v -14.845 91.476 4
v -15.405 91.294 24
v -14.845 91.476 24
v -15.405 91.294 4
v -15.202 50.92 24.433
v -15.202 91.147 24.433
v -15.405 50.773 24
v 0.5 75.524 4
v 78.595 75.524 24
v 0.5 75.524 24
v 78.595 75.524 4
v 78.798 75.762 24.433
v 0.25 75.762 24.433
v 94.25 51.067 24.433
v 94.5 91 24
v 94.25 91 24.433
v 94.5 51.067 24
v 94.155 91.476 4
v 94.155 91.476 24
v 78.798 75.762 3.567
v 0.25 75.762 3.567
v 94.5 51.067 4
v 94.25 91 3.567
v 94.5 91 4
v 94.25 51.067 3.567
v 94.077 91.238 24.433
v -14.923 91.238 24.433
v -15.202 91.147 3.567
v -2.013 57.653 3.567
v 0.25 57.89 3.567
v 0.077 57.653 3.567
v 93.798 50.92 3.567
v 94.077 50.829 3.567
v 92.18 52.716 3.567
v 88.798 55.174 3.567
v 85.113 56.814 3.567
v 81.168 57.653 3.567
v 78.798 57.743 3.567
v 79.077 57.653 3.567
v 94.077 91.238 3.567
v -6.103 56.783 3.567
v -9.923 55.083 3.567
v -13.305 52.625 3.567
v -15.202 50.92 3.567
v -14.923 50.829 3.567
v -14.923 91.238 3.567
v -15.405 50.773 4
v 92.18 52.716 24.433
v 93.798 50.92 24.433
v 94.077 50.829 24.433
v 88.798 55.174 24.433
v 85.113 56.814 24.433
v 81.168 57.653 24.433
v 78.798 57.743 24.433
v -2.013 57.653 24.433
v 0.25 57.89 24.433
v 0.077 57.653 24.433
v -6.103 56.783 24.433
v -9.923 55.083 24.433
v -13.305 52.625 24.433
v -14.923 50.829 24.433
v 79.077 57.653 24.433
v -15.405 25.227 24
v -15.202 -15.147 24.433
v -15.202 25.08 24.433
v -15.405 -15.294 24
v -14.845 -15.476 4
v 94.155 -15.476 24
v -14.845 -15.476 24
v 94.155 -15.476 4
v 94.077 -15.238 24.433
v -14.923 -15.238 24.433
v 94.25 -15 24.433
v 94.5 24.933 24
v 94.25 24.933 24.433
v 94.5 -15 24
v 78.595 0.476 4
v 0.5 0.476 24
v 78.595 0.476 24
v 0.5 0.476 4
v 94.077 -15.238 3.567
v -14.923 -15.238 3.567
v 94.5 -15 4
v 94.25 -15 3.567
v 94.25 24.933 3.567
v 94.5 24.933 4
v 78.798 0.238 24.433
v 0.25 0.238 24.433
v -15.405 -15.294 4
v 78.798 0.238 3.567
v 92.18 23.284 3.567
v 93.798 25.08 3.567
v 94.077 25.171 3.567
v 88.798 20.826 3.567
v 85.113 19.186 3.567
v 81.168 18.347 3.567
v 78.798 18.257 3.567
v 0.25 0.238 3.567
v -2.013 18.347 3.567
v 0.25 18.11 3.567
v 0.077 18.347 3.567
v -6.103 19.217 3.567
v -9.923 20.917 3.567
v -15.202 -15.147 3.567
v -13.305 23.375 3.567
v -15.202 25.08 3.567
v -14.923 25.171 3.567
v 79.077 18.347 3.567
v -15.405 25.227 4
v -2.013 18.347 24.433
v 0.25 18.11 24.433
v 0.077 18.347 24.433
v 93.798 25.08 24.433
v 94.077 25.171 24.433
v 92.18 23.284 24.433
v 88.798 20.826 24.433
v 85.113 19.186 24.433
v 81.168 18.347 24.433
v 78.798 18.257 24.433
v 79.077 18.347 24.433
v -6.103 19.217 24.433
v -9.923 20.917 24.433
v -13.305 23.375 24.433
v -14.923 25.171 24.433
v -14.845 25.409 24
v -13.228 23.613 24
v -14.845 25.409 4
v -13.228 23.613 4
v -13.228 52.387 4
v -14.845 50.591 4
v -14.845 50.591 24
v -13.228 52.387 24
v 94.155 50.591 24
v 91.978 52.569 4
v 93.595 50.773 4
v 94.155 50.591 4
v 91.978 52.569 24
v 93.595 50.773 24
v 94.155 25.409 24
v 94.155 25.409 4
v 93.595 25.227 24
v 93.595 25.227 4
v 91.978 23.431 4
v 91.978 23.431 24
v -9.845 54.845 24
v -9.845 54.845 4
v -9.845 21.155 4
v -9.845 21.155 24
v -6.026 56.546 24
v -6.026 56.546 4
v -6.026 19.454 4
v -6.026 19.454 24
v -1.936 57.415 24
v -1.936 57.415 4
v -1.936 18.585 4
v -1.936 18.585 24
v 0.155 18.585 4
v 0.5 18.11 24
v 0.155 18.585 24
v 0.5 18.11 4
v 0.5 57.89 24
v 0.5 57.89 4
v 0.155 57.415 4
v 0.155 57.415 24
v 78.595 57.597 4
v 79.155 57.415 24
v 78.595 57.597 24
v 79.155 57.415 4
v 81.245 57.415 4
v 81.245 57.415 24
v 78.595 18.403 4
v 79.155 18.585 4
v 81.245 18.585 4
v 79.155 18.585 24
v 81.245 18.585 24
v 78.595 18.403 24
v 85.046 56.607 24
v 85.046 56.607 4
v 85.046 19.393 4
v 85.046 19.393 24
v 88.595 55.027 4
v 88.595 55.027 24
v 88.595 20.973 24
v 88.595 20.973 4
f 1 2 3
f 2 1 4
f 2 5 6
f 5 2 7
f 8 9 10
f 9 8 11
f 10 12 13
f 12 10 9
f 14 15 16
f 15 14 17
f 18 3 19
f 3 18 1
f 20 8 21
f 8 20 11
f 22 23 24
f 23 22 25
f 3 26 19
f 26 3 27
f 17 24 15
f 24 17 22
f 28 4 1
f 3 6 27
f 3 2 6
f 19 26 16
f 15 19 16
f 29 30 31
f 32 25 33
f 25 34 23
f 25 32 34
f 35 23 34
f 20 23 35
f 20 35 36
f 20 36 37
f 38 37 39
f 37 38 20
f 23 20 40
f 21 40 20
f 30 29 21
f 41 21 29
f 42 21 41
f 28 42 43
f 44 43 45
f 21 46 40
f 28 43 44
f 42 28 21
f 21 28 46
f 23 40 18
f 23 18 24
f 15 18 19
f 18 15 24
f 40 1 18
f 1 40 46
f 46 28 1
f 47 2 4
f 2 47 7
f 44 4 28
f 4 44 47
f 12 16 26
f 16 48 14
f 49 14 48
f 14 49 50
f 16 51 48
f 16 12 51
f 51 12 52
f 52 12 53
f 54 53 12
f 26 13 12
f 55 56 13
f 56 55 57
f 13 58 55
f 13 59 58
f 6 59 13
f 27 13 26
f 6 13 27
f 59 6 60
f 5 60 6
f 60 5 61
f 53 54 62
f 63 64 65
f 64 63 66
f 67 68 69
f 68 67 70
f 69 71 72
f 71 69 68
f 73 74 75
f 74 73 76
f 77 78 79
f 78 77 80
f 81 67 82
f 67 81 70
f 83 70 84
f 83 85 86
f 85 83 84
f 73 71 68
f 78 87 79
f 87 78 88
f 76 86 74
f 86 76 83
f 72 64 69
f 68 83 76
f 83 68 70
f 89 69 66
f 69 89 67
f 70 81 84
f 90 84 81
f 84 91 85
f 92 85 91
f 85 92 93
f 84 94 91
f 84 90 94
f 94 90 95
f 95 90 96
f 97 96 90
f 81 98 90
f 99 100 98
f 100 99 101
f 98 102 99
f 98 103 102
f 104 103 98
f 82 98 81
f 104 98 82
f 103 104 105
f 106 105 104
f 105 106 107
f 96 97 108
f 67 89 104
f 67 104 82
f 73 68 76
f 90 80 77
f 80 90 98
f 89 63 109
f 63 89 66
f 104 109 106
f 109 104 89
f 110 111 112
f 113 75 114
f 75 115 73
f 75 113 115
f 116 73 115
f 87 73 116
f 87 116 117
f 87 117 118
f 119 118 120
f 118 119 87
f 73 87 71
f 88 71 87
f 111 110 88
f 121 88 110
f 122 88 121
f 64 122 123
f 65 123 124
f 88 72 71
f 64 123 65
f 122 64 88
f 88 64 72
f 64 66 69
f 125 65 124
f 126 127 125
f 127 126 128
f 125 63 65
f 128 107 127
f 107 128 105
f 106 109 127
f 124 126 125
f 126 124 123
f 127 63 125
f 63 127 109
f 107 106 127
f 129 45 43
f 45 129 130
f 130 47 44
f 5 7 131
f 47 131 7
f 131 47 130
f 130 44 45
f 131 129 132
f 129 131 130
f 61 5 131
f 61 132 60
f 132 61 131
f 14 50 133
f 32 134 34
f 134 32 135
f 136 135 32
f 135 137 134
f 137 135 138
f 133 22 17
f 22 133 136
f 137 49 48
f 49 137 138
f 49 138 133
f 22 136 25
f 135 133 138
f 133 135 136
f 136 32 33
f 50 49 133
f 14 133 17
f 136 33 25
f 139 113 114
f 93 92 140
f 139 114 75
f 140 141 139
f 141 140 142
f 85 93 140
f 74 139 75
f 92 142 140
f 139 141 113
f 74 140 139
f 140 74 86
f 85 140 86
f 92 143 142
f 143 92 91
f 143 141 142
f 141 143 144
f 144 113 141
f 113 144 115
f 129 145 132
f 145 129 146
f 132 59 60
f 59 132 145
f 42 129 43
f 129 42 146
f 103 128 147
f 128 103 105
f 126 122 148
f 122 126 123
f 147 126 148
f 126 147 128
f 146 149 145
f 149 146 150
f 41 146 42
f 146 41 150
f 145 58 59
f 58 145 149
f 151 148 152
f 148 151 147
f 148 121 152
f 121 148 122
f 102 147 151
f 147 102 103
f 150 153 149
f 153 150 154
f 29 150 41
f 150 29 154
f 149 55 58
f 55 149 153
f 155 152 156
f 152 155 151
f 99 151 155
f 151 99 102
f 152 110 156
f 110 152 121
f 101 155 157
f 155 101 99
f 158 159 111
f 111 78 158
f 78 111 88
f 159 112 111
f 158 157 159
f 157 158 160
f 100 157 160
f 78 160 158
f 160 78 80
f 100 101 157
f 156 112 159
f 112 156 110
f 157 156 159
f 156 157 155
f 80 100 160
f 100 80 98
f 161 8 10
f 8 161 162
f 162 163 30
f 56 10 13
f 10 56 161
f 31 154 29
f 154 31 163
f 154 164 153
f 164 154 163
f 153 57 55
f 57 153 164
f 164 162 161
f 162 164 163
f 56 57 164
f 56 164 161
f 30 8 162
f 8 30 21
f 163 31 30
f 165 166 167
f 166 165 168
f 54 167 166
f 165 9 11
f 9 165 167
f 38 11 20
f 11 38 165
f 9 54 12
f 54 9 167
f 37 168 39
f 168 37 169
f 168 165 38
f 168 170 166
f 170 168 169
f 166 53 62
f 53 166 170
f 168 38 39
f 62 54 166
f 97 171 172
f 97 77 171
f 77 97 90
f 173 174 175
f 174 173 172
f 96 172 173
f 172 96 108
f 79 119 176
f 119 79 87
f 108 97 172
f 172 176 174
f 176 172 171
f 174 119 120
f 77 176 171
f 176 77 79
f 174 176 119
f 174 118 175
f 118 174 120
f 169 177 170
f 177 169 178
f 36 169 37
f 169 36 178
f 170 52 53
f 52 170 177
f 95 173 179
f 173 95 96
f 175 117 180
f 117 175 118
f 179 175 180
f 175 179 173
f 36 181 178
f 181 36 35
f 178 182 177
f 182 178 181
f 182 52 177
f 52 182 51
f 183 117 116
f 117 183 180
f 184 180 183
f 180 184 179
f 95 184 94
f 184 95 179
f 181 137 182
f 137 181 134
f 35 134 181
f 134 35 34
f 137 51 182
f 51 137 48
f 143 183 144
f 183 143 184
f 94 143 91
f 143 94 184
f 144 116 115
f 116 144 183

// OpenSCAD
width = 79;
length = 76;
height = 30;

module indent(){
color([1,0,0])
translate([0,length/2,0])
cylinder(40,20,20,20);

color([1,0,0])
translate([width,length/2,0])
cylinder(40,20,20,20);

cube([width,length,height+10]);
}


module box(){
color([0,1,0])
translate([-15,-15,4])
cube([width+30,length+30,height-10]);
}

module postitholder(){
	difference(){
		box();
		indent();
	}
}


minkowski(){
	postitholder();
	sphere(0.5);
}
